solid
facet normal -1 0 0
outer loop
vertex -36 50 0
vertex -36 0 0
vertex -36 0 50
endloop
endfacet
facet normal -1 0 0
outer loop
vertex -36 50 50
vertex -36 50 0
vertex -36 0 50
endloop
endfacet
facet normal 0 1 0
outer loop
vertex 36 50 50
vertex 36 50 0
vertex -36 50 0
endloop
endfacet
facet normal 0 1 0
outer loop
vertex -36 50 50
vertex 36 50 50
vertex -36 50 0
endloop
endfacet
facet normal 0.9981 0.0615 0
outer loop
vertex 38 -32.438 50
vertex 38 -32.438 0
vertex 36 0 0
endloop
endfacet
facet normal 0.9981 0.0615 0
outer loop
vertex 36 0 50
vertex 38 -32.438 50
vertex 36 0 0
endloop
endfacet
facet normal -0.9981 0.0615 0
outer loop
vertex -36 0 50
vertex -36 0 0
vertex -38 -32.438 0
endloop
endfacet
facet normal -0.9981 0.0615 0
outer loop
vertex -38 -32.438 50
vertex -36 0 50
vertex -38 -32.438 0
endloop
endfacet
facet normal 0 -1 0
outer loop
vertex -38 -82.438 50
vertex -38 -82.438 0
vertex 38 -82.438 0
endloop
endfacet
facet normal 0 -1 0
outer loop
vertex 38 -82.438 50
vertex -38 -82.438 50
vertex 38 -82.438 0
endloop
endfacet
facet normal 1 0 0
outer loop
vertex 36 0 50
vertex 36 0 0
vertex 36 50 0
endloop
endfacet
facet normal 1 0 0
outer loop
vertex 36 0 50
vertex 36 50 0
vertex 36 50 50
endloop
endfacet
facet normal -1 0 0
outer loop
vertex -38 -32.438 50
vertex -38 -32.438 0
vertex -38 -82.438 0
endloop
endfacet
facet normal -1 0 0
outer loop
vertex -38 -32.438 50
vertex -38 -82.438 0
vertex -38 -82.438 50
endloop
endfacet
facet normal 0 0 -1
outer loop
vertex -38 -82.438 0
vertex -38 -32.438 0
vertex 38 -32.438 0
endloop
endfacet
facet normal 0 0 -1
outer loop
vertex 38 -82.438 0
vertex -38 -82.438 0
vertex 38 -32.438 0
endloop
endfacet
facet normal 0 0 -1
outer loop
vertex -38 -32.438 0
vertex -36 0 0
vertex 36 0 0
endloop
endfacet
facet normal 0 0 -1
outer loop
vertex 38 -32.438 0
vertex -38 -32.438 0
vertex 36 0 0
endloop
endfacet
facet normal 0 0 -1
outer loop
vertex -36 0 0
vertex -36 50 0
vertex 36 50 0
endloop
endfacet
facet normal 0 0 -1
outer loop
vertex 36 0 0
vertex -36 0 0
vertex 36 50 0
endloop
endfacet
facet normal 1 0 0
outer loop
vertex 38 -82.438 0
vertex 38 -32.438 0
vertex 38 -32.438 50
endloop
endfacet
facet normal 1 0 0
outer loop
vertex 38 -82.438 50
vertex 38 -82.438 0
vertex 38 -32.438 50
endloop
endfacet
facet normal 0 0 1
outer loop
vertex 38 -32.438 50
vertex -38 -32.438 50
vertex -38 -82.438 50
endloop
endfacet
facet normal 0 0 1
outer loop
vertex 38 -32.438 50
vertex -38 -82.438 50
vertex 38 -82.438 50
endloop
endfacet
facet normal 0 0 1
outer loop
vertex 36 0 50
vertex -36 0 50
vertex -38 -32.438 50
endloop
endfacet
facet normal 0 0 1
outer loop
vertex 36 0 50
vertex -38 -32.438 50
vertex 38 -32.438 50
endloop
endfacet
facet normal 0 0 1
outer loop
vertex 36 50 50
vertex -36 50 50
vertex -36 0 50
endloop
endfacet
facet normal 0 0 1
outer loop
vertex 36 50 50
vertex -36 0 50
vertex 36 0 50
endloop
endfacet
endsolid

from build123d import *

# Parameters (mm, degrees)
F1_DEPTH = 50
F2_DEPTH = 50
F3_DEPTH = 50


with BuildPart() as f1:
    # F0 (on Top) → F1 (new body)
    with BuildSketch(Plane.XY):
        Polygon((-38, -32.4384031666), (0, -32.4384031666), (38, -32.4384031666), (36, 0), (0, 0), (-36, 0), align=None)
    extrude(amount=F1_DEPTH)

    # F2 (add): a face of the model
    f2_faces = [f1.faces().sort_by_distance(p)[0] for p in [
        (0, 0, 25),
    ]]
    extrude(f2_faces, amount=F2_DEPTH)

    # F3 (add): a face of the model
    f3_faces = [f1.faces().sort_by_distance(p)[0] for p in [
        (0, -32.4384031666, 25),
    ]]
    extrude(f3_faces, amount=F3_DEPTH)


solid = f1.part
